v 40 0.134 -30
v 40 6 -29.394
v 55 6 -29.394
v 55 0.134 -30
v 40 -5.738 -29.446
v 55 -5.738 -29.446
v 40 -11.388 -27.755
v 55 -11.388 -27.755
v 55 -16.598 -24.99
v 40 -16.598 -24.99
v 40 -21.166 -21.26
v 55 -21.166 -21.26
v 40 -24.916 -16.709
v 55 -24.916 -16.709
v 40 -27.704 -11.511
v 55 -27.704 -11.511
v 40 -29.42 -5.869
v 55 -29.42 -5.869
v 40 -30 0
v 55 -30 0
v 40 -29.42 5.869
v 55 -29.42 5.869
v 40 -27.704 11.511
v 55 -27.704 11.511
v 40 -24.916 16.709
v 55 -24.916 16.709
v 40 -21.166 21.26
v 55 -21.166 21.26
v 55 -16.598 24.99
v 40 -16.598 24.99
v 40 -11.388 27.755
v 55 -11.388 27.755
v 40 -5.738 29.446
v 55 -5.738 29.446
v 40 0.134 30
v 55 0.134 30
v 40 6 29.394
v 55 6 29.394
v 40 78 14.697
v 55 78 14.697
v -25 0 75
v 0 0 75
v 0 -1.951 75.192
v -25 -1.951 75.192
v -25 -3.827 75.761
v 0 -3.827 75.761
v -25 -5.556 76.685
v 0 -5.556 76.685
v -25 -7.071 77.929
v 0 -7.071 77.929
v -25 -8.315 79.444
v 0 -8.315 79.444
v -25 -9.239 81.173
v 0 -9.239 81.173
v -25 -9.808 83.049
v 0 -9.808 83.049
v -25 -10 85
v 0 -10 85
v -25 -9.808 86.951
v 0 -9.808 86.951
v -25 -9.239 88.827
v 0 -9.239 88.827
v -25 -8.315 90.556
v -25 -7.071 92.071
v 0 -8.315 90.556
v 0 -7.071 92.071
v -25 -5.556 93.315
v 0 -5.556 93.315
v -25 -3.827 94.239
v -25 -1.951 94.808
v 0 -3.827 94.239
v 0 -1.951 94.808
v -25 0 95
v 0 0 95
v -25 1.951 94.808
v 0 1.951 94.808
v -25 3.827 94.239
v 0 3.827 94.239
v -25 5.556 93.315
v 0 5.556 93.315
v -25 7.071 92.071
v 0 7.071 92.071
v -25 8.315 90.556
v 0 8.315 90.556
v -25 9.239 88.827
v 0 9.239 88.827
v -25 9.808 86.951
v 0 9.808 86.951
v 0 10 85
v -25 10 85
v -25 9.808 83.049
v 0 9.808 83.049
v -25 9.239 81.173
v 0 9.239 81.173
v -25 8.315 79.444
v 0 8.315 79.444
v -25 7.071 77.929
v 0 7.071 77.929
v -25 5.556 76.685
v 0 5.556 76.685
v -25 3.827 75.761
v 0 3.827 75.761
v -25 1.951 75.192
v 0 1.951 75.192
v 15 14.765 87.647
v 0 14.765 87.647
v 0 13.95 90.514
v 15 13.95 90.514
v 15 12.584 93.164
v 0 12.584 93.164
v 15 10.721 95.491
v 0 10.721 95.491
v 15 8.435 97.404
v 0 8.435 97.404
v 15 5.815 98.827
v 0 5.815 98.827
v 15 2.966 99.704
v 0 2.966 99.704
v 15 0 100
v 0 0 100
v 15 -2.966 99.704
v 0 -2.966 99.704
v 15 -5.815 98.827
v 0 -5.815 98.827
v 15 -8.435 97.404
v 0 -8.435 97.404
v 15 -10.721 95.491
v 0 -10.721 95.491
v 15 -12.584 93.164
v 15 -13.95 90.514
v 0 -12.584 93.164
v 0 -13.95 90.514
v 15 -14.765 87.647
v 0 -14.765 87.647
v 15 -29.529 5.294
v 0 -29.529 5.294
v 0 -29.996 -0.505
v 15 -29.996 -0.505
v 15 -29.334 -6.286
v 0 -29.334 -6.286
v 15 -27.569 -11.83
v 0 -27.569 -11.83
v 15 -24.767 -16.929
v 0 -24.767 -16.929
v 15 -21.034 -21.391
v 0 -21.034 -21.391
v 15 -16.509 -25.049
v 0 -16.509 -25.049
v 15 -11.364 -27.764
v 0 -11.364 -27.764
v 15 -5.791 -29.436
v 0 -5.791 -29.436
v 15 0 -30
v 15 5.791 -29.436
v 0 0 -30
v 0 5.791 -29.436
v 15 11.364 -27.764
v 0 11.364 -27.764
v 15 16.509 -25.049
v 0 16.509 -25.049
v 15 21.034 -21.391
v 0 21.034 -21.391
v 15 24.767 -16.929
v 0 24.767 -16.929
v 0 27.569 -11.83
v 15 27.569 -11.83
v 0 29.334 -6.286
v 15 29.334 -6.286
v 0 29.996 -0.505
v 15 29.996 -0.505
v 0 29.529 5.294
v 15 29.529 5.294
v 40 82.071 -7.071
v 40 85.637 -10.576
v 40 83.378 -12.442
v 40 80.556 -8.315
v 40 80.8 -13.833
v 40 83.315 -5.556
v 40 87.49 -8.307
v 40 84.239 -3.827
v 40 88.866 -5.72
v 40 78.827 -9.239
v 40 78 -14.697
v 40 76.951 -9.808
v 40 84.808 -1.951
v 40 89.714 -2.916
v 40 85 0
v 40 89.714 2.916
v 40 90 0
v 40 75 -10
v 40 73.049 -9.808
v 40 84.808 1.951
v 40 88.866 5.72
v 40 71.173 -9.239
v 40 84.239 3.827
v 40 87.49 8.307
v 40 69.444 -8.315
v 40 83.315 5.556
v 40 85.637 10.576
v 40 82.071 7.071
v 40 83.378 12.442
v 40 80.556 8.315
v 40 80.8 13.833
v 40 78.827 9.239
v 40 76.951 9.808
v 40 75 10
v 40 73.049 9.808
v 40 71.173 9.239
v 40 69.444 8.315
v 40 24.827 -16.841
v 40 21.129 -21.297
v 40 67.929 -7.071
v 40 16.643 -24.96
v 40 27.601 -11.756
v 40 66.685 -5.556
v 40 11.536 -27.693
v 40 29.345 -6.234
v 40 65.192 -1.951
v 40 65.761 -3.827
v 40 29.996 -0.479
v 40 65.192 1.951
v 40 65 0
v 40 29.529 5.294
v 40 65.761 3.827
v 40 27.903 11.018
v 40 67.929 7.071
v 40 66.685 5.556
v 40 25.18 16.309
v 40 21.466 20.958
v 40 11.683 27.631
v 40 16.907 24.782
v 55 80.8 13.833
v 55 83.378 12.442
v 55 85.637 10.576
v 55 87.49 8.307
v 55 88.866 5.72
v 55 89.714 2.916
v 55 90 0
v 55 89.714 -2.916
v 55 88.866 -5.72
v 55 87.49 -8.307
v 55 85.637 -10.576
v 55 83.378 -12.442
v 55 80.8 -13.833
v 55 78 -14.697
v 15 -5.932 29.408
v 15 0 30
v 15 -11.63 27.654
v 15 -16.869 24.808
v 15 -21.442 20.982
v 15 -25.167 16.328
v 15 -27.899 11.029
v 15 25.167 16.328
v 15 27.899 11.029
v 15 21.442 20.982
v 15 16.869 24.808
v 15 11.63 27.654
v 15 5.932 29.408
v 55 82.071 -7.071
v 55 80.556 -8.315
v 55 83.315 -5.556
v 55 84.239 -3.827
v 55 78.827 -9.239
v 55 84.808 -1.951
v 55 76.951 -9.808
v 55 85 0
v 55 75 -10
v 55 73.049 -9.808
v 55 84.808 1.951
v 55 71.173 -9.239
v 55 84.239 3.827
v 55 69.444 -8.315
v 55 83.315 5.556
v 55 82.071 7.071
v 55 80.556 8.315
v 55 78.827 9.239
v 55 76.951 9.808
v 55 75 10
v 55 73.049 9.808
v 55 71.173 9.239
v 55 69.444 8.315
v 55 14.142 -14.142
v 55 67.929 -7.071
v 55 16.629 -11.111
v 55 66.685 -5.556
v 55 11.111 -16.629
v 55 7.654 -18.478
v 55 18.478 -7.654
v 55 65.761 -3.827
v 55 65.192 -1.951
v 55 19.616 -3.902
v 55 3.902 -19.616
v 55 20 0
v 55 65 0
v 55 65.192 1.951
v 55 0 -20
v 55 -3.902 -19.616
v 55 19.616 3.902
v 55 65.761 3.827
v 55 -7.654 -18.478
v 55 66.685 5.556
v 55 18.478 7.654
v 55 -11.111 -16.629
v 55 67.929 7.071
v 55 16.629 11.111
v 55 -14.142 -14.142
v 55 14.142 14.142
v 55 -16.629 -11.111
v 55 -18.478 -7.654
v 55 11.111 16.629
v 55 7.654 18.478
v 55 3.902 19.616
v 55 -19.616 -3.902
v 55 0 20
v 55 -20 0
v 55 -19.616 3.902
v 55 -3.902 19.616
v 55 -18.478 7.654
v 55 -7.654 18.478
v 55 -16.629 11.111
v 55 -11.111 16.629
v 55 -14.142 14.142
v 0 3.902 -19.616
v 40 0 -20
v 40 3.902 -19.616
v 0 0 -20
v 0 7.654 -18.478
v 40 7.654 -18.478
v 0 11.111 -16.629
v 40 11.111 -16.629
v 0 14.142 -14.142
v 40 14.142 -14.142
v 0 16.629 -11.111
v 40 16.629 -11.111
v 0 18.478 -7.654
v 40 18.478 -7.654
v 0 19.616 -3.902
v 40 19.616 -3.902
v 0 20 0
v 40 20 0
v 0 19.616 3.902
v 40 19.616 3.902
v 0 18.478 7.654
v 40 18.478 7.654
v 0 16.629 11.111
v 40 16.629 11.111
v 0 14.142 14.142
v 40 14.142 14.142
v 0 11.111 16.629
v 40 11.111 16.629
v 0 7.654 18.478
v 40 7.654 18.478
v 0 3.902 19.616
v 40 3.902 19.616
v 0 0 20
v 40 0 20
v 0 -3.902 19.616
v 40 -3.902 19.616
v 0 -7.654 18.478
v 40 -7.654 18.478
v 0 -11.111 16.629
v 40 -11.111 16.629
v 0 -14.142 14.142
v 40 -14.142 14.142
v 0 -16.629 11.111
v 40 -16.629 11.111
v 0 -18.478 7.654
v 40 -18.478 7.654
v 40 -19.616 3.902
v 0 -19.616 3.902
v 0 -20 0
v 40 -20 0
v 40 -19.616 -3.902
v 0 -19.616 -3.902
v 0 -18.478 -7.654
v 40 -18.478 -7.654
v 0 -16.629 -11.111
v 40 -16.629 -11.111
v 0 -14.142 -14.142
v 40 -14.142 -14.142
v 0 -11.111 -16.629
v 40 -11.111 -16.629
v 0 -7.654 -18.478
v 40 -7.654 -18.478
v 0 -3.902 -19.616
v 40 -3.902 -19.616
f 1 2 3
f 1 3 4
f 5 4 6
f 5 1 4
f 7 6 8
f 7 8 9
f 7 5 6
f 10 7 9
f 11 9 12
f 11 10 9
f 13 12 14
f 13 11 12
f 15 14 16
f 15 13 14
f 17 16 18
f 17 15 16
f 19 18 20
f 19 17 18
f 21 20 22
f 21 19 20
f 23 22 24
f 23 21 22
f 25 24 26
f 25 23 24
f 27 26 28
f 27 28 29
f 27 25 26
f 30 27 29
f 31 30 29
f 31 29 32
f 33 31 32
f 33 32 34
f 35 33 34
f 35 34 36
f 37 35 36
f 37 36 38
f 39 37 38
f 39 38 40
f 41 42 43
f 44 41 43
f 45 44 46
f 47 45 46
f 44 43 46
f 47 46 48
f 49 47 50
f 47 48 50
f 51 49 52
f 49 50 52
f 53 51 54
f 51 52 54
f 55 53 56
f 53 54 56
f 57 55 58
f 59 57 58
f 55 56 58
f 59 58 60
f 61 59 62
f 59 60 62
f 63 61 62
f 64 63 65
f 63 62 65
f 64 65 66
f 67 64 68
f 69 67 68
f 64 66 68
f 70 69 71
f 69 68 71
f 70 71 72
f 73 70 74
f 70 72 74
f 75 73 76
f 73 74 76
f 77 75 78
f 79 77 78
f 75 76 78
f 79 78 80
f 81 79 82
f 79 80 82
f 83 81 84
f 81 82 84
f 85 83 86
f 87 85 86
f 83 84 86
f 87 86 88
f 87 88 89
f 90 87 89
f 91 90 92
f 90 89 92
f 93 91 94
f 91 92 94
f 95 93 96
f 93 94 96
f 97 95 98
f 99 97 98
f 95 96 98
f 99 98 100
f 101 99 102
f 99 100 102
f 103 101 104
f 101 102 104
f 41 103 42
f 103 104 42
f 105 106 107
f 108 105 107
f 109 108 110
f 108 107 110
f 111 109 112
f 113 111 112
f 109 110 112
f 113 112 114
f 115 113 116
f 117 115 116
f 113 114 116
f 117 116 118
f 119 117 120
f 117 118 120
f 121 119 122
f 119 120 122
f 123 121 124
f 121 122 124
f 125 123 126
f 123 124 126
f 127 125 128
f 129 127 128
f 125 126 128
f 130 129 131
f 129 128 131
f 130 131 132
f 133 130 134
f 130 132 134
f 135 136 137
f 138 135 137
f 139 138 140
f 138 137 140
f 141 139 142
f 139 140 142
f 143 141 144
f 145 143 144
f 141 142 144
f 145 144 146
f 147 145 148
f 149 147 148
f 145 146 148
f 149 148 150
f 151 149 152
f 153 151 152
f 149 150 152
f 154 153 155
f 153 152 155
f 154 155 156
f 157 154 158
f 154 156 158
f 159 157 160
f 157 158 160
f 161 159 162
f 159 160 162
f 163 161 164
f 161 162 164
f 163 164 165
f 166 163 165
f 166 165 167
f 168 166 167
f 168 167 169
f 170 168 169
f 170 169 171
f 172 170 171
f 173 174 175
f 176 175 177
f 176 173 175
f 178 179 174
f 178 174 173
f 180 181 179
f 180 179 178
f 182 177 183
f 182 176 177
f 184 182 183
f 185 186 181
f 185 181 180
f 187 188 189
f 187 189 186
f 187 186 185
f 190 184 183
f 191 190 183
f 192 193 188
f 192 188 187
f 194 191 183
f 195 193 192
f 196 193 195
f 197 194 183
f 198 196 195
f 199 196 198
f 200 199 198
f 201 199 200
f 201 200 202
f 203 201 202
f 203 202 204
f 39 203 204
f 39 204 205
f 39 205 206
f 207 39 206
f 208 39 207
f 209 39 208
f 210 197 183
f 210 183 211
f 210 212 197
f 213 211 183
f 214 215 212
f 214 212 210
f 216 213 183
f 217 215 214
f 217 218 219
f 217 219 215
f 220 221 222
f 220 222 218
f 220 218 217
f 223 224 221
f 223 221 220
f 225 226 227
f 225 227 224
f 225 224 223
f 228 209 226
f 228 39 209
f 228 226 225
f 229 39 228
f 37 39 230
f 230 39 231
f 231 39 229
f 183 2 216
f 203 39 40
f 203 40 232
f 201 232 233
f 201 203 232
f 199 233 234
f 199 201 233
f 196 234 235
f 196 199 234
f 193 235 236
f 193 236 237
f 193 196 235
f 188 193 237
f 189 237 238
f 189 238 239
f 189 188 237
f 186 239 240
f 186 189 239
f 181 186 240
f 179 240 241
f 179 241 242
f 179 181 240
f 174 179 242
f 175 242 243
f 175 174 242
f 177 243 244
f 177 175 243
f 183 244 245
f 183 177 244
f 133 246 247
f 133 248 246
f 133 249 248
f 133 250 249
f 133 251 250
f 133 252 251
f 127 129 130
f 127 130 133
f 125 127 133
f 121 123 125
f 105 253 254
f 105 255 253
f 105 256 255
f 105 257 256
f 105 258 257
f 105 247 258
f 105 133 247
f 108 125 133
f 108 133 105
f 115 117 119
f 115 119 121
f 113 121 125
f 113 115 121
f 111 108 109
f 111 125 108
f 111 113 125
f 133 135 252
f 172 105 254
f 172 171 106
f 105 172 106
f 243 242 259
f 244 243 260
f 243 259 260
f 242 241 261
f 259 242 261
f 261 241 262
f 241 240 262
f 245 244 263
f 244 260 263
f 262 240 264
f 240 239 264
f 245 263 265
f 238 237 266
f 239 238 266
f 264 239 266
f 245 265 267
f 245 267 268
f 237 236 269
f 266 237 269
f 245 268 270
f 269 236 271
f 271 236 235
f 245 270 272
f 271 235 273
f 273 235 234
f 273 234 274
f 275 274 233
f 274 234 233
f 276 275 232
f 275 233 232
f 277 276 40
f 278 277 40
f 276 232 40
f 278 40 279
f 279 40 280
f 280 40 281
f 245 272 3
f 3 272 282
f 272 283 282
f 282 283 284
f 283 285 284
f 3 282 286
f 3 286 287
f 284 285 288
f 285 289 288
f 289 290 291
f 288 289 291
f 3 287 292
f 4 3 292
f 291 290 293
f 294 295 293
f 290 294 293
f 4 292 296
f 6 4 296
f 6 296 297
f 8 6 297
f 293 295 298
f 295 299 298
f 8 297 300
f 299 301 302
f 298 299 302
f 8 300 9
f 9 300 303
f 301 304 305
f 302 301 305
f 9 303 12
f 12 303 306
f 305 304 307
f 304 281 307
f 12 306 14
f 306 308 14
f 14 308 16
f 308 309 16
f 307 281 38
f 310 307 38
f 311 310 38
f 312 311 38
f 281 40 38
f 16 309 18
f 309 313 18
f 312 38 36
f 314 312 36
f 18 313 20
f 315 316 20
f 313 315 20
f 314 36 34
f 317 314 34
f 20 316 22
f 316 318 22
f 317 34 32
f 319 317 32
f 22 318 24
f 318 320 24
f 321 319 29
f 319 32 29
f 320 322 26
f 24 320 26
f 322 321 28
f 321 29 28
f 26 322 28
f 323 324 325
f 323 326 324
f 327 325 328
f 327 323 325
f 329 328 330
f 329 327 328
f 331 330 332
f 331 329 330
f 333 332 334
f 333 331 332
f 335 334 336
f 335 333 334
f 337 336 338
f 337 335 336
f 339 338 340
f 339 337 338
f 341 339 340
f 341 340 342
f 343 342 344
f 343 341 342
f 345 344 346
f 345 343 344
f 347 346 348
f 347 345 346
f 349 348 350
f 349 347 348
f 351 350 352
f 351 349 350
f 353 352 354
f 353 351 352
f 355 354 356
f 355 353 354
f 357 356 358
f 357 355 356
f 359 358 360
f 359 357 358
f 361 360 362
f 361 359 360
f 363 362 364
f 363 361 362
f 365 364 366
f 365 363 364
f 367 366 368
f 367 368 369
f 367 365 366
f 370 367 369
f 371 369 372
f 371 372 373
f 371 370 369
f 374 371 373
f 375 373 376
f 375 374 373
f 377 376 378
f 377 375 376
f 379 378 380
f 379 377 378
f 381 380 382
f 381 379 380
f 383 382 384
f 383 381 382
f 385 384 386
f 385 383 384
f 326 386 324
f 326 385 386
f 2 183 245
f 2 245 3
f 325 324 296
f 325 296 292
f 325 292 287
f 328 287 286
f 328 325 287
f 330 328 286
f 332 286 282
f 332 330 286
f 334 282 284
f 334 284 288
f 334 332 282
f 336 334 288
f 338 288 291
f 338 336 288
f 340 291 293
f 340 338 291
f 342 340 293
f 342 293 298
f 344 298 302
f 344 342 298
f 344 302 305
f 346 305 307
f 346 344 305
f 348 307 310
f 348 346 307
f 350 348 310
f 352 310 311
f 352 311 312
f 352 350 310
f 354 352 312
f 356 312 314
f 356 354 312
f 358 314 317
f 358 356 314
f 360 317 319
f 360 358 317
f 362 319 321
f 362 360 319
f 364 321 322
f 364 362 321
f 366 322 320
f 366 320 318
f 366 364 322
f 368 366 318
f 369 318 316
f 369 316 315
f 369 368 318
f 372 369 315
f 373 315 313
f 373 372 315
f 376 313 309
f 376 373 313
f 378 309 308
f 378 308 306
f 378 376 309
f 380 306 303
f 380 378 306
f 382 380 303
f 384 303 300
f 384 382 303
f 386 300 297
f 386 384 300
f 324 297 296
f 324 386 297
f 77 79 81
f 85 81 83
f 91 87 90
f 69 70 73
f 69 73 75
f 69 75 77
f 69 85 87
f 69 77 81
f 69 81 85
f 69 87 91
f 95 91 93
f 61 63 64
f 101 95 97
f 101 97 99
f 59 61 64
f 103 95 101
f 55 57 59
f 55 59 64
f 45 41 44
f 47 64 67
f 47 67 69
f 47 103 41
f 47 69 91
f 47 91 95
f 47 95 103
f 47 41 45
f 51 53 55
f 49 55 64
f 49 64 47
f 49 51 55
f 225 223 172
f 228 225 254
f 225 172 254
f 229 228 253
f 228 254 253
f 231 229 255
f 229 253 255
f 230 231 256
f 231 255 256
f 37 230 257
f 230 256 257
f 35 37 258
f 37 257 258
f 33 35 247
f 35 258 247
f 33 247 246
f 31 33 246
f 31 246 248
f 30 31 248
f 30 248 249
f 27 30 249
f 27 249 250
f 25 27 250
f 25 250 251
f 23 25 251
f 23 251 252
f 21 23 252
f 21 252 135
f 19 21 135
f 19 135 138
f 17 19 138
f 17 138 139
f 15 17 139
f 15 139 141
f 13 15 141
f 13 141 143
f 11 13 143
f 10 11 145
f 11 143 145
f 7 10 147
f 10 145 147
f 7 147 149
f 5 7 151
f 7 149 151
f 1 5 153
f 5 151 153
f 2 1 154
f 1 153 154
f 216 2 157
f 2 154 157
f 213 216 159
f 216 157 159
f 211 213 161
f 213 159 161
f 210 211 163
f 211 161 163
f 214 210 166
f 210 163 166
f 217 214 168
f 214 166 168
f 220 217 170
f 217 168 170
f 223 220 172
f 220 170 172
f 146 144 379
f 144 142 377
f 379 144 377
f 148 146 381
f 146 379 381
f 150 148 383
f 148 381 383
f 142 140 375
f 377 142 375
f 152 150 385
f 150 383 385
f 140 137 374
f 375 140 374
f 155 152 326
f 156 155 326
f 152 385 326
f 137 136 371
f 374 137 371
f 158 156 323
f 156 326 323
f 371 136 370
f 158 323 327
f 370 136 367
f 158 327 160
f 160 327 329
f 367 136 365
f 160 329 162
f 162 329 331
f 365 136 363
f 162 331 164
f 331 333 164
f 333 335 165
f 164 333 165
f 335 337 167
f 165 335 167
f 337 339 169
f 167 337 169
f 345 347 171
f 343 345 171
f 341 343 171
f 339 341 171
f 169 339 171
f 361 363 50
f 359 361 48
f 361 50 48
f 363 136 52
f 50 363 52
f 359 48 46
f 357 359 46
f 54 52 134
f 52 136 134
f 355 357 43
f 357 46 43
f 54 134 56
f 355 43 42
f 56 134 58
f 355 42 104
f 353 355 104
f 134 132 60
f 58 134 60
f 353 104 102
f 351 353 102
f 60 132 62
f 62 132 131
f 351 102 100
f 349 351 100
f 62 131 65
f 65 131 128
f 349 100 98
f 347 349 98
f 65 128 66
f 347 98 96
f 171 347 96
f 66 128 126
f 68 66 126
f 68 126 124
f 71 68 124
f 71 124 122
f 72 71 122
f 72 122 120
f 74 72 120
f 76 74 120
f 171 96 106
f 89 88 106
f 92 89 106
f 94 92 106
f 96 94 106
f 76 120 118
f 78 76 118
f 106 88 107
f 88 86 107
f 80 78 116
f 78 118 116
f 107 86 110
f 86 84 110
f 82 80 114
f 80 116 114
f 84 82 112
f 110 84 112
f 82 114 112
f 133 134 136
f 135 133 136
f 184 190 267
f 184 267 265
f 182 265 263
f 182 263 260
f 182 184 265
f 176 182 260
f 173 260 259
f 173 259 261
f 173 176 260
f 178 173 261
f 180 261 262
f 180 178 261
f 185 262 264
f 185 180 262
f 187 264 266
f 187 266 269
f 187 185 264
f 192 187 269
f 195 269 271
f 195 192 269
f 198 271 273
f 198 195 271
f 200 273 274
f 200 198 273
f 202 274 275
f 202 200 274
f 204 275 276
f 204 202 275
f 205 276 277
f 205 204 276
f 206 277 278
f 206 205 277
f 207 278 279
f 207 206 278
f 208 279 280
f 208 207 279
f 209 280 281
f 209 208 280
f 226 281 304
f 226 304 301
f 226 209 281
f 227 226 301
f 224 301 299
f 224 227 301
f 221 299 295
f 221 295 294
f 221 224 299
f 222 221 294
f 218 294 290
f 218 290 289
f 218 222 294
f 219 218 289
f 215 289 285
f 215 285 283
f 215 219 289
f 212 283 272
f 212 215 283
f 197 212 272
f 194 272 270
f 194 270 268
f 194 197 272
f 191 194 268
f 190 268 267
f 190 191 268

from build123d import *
from build123d.topology import SkipClean

# Parameters (mm, degrees)
BOSS_EXTRUDE1_DEPTH     = 15
SKETCH2_R               = 30
BOSS_EXTRUDE2_DEPTH     = 25
SKETCH3_R               = 20
SKETCH3_R_2             = 10
BOSS_EXTRUDE3_DEPTH     = 15
CUT_EXTRUDE1_DEPTH      = 146.344418537
CUT_EXTRUDE1_DEPTH_BACK = 146.344418537
SKETCH4_R               = 20
SKETCH5_R               = 10
BOSS_EXTRUDE4_DEPTH     = 25


with BuildPart() as part:
    # Sketch1 → Boss-Extrude1 (new body)
    with BuildSketch(Plane.YZ):
        with BuildLine():
            Line((-14.764588704, 87.647058824), (-29.529177407, 5.294117647))
            ThreePointArc((-29.529177407, 5.294117647), (0, -30), (29.529177407, 5.294117647))
            Line((29.529177407, 5.294117647), (14.764588704, 87.647058824))
            ThreePointArc((14.764588704, 87.647058824), (0, 100), (-14.764588704, 87.647058824))
        make_face()
    extrude(amount=BOSS_EXTRUDE1_DEPTH)

    # Sketch2 → Boss-Extrude2 (add)
    with BuildSketch(Plane.YZ.offset(15)):
        with Locations(Location((0, 0, 0), (0, 0, 10.164248622))):
            Circle(SKETCH2_R)
    extrude(amount=BOSS_EXTRUDE2_DEPTH)

    # Sketch3 → Boss-Extrude3 (add)
    with SkipClean():  # the faces are left unmerged after this step: merging them gives an invalid solid
        with BuildSketch(Plane.YZ.offset(40)):
            with BuildLine():
                Line((6, 29.393876913), (78, 14.696938457))
                ThreePointArc((78, 14.696938457), (90, 0), (78, -14.696938457))
                Line((78, -14.696938457), (6, -29.393876913))
                ThreePointArc((6, -29.393876913), (-30, 0), (6, 29.393876913))
            make_face()
            with Locations(Location((0, 0, 0), (0, 0, 270))):
                Circle(SKETCH3_R, mode=Mode.SUBTRACT)
            with Locations(Location((75, 0, 0), (0, 0, 270))):
                Circle(SKETCH3_R_2, mode=Mode.SUBTRACT)
        extrude(amount=BOSS_EXTRUDE3_DEPTH)

    # Sketch4 → Cut-Extrude1 (cut, two sides: drawn at the far end of the back side and taken through both)
    with SkipClean():  # the faces are left unmerged after this step: merging them gives an invalid solid
        with BuildSketch(Plane.YZ.offset(55).offset(-CUT_EXTRUDE1_DEPTH_BACK)):
            with Locations(Location((0, 0, 0), (0, 0, 270))):
                Circle(SKETCH4_R)
        extrude(amount=CUT_EXTRUDE1_DEPTH + CUT_EXTRUDE1_DEPTH_BACK, mode=Mode.SUBTRACT)

    # Sketch5 → Boss-Extrude4 (add)
    with SkipClean():  # the faces are left unmerged after this step: merging them gives an invalid solid
        with BuildSketch(Plane(origin=(0, 0, 0), x_dir=(0, -1, 0), z_dir=(-1, 0, 0))):
            with Locations(Location((0, 85, 0), (0, 0, 270))):
                Circle(SKETCH5_R)
        extrude(amount=BOSS_EXTRUDE4_DEPTH)


solid = part.part
